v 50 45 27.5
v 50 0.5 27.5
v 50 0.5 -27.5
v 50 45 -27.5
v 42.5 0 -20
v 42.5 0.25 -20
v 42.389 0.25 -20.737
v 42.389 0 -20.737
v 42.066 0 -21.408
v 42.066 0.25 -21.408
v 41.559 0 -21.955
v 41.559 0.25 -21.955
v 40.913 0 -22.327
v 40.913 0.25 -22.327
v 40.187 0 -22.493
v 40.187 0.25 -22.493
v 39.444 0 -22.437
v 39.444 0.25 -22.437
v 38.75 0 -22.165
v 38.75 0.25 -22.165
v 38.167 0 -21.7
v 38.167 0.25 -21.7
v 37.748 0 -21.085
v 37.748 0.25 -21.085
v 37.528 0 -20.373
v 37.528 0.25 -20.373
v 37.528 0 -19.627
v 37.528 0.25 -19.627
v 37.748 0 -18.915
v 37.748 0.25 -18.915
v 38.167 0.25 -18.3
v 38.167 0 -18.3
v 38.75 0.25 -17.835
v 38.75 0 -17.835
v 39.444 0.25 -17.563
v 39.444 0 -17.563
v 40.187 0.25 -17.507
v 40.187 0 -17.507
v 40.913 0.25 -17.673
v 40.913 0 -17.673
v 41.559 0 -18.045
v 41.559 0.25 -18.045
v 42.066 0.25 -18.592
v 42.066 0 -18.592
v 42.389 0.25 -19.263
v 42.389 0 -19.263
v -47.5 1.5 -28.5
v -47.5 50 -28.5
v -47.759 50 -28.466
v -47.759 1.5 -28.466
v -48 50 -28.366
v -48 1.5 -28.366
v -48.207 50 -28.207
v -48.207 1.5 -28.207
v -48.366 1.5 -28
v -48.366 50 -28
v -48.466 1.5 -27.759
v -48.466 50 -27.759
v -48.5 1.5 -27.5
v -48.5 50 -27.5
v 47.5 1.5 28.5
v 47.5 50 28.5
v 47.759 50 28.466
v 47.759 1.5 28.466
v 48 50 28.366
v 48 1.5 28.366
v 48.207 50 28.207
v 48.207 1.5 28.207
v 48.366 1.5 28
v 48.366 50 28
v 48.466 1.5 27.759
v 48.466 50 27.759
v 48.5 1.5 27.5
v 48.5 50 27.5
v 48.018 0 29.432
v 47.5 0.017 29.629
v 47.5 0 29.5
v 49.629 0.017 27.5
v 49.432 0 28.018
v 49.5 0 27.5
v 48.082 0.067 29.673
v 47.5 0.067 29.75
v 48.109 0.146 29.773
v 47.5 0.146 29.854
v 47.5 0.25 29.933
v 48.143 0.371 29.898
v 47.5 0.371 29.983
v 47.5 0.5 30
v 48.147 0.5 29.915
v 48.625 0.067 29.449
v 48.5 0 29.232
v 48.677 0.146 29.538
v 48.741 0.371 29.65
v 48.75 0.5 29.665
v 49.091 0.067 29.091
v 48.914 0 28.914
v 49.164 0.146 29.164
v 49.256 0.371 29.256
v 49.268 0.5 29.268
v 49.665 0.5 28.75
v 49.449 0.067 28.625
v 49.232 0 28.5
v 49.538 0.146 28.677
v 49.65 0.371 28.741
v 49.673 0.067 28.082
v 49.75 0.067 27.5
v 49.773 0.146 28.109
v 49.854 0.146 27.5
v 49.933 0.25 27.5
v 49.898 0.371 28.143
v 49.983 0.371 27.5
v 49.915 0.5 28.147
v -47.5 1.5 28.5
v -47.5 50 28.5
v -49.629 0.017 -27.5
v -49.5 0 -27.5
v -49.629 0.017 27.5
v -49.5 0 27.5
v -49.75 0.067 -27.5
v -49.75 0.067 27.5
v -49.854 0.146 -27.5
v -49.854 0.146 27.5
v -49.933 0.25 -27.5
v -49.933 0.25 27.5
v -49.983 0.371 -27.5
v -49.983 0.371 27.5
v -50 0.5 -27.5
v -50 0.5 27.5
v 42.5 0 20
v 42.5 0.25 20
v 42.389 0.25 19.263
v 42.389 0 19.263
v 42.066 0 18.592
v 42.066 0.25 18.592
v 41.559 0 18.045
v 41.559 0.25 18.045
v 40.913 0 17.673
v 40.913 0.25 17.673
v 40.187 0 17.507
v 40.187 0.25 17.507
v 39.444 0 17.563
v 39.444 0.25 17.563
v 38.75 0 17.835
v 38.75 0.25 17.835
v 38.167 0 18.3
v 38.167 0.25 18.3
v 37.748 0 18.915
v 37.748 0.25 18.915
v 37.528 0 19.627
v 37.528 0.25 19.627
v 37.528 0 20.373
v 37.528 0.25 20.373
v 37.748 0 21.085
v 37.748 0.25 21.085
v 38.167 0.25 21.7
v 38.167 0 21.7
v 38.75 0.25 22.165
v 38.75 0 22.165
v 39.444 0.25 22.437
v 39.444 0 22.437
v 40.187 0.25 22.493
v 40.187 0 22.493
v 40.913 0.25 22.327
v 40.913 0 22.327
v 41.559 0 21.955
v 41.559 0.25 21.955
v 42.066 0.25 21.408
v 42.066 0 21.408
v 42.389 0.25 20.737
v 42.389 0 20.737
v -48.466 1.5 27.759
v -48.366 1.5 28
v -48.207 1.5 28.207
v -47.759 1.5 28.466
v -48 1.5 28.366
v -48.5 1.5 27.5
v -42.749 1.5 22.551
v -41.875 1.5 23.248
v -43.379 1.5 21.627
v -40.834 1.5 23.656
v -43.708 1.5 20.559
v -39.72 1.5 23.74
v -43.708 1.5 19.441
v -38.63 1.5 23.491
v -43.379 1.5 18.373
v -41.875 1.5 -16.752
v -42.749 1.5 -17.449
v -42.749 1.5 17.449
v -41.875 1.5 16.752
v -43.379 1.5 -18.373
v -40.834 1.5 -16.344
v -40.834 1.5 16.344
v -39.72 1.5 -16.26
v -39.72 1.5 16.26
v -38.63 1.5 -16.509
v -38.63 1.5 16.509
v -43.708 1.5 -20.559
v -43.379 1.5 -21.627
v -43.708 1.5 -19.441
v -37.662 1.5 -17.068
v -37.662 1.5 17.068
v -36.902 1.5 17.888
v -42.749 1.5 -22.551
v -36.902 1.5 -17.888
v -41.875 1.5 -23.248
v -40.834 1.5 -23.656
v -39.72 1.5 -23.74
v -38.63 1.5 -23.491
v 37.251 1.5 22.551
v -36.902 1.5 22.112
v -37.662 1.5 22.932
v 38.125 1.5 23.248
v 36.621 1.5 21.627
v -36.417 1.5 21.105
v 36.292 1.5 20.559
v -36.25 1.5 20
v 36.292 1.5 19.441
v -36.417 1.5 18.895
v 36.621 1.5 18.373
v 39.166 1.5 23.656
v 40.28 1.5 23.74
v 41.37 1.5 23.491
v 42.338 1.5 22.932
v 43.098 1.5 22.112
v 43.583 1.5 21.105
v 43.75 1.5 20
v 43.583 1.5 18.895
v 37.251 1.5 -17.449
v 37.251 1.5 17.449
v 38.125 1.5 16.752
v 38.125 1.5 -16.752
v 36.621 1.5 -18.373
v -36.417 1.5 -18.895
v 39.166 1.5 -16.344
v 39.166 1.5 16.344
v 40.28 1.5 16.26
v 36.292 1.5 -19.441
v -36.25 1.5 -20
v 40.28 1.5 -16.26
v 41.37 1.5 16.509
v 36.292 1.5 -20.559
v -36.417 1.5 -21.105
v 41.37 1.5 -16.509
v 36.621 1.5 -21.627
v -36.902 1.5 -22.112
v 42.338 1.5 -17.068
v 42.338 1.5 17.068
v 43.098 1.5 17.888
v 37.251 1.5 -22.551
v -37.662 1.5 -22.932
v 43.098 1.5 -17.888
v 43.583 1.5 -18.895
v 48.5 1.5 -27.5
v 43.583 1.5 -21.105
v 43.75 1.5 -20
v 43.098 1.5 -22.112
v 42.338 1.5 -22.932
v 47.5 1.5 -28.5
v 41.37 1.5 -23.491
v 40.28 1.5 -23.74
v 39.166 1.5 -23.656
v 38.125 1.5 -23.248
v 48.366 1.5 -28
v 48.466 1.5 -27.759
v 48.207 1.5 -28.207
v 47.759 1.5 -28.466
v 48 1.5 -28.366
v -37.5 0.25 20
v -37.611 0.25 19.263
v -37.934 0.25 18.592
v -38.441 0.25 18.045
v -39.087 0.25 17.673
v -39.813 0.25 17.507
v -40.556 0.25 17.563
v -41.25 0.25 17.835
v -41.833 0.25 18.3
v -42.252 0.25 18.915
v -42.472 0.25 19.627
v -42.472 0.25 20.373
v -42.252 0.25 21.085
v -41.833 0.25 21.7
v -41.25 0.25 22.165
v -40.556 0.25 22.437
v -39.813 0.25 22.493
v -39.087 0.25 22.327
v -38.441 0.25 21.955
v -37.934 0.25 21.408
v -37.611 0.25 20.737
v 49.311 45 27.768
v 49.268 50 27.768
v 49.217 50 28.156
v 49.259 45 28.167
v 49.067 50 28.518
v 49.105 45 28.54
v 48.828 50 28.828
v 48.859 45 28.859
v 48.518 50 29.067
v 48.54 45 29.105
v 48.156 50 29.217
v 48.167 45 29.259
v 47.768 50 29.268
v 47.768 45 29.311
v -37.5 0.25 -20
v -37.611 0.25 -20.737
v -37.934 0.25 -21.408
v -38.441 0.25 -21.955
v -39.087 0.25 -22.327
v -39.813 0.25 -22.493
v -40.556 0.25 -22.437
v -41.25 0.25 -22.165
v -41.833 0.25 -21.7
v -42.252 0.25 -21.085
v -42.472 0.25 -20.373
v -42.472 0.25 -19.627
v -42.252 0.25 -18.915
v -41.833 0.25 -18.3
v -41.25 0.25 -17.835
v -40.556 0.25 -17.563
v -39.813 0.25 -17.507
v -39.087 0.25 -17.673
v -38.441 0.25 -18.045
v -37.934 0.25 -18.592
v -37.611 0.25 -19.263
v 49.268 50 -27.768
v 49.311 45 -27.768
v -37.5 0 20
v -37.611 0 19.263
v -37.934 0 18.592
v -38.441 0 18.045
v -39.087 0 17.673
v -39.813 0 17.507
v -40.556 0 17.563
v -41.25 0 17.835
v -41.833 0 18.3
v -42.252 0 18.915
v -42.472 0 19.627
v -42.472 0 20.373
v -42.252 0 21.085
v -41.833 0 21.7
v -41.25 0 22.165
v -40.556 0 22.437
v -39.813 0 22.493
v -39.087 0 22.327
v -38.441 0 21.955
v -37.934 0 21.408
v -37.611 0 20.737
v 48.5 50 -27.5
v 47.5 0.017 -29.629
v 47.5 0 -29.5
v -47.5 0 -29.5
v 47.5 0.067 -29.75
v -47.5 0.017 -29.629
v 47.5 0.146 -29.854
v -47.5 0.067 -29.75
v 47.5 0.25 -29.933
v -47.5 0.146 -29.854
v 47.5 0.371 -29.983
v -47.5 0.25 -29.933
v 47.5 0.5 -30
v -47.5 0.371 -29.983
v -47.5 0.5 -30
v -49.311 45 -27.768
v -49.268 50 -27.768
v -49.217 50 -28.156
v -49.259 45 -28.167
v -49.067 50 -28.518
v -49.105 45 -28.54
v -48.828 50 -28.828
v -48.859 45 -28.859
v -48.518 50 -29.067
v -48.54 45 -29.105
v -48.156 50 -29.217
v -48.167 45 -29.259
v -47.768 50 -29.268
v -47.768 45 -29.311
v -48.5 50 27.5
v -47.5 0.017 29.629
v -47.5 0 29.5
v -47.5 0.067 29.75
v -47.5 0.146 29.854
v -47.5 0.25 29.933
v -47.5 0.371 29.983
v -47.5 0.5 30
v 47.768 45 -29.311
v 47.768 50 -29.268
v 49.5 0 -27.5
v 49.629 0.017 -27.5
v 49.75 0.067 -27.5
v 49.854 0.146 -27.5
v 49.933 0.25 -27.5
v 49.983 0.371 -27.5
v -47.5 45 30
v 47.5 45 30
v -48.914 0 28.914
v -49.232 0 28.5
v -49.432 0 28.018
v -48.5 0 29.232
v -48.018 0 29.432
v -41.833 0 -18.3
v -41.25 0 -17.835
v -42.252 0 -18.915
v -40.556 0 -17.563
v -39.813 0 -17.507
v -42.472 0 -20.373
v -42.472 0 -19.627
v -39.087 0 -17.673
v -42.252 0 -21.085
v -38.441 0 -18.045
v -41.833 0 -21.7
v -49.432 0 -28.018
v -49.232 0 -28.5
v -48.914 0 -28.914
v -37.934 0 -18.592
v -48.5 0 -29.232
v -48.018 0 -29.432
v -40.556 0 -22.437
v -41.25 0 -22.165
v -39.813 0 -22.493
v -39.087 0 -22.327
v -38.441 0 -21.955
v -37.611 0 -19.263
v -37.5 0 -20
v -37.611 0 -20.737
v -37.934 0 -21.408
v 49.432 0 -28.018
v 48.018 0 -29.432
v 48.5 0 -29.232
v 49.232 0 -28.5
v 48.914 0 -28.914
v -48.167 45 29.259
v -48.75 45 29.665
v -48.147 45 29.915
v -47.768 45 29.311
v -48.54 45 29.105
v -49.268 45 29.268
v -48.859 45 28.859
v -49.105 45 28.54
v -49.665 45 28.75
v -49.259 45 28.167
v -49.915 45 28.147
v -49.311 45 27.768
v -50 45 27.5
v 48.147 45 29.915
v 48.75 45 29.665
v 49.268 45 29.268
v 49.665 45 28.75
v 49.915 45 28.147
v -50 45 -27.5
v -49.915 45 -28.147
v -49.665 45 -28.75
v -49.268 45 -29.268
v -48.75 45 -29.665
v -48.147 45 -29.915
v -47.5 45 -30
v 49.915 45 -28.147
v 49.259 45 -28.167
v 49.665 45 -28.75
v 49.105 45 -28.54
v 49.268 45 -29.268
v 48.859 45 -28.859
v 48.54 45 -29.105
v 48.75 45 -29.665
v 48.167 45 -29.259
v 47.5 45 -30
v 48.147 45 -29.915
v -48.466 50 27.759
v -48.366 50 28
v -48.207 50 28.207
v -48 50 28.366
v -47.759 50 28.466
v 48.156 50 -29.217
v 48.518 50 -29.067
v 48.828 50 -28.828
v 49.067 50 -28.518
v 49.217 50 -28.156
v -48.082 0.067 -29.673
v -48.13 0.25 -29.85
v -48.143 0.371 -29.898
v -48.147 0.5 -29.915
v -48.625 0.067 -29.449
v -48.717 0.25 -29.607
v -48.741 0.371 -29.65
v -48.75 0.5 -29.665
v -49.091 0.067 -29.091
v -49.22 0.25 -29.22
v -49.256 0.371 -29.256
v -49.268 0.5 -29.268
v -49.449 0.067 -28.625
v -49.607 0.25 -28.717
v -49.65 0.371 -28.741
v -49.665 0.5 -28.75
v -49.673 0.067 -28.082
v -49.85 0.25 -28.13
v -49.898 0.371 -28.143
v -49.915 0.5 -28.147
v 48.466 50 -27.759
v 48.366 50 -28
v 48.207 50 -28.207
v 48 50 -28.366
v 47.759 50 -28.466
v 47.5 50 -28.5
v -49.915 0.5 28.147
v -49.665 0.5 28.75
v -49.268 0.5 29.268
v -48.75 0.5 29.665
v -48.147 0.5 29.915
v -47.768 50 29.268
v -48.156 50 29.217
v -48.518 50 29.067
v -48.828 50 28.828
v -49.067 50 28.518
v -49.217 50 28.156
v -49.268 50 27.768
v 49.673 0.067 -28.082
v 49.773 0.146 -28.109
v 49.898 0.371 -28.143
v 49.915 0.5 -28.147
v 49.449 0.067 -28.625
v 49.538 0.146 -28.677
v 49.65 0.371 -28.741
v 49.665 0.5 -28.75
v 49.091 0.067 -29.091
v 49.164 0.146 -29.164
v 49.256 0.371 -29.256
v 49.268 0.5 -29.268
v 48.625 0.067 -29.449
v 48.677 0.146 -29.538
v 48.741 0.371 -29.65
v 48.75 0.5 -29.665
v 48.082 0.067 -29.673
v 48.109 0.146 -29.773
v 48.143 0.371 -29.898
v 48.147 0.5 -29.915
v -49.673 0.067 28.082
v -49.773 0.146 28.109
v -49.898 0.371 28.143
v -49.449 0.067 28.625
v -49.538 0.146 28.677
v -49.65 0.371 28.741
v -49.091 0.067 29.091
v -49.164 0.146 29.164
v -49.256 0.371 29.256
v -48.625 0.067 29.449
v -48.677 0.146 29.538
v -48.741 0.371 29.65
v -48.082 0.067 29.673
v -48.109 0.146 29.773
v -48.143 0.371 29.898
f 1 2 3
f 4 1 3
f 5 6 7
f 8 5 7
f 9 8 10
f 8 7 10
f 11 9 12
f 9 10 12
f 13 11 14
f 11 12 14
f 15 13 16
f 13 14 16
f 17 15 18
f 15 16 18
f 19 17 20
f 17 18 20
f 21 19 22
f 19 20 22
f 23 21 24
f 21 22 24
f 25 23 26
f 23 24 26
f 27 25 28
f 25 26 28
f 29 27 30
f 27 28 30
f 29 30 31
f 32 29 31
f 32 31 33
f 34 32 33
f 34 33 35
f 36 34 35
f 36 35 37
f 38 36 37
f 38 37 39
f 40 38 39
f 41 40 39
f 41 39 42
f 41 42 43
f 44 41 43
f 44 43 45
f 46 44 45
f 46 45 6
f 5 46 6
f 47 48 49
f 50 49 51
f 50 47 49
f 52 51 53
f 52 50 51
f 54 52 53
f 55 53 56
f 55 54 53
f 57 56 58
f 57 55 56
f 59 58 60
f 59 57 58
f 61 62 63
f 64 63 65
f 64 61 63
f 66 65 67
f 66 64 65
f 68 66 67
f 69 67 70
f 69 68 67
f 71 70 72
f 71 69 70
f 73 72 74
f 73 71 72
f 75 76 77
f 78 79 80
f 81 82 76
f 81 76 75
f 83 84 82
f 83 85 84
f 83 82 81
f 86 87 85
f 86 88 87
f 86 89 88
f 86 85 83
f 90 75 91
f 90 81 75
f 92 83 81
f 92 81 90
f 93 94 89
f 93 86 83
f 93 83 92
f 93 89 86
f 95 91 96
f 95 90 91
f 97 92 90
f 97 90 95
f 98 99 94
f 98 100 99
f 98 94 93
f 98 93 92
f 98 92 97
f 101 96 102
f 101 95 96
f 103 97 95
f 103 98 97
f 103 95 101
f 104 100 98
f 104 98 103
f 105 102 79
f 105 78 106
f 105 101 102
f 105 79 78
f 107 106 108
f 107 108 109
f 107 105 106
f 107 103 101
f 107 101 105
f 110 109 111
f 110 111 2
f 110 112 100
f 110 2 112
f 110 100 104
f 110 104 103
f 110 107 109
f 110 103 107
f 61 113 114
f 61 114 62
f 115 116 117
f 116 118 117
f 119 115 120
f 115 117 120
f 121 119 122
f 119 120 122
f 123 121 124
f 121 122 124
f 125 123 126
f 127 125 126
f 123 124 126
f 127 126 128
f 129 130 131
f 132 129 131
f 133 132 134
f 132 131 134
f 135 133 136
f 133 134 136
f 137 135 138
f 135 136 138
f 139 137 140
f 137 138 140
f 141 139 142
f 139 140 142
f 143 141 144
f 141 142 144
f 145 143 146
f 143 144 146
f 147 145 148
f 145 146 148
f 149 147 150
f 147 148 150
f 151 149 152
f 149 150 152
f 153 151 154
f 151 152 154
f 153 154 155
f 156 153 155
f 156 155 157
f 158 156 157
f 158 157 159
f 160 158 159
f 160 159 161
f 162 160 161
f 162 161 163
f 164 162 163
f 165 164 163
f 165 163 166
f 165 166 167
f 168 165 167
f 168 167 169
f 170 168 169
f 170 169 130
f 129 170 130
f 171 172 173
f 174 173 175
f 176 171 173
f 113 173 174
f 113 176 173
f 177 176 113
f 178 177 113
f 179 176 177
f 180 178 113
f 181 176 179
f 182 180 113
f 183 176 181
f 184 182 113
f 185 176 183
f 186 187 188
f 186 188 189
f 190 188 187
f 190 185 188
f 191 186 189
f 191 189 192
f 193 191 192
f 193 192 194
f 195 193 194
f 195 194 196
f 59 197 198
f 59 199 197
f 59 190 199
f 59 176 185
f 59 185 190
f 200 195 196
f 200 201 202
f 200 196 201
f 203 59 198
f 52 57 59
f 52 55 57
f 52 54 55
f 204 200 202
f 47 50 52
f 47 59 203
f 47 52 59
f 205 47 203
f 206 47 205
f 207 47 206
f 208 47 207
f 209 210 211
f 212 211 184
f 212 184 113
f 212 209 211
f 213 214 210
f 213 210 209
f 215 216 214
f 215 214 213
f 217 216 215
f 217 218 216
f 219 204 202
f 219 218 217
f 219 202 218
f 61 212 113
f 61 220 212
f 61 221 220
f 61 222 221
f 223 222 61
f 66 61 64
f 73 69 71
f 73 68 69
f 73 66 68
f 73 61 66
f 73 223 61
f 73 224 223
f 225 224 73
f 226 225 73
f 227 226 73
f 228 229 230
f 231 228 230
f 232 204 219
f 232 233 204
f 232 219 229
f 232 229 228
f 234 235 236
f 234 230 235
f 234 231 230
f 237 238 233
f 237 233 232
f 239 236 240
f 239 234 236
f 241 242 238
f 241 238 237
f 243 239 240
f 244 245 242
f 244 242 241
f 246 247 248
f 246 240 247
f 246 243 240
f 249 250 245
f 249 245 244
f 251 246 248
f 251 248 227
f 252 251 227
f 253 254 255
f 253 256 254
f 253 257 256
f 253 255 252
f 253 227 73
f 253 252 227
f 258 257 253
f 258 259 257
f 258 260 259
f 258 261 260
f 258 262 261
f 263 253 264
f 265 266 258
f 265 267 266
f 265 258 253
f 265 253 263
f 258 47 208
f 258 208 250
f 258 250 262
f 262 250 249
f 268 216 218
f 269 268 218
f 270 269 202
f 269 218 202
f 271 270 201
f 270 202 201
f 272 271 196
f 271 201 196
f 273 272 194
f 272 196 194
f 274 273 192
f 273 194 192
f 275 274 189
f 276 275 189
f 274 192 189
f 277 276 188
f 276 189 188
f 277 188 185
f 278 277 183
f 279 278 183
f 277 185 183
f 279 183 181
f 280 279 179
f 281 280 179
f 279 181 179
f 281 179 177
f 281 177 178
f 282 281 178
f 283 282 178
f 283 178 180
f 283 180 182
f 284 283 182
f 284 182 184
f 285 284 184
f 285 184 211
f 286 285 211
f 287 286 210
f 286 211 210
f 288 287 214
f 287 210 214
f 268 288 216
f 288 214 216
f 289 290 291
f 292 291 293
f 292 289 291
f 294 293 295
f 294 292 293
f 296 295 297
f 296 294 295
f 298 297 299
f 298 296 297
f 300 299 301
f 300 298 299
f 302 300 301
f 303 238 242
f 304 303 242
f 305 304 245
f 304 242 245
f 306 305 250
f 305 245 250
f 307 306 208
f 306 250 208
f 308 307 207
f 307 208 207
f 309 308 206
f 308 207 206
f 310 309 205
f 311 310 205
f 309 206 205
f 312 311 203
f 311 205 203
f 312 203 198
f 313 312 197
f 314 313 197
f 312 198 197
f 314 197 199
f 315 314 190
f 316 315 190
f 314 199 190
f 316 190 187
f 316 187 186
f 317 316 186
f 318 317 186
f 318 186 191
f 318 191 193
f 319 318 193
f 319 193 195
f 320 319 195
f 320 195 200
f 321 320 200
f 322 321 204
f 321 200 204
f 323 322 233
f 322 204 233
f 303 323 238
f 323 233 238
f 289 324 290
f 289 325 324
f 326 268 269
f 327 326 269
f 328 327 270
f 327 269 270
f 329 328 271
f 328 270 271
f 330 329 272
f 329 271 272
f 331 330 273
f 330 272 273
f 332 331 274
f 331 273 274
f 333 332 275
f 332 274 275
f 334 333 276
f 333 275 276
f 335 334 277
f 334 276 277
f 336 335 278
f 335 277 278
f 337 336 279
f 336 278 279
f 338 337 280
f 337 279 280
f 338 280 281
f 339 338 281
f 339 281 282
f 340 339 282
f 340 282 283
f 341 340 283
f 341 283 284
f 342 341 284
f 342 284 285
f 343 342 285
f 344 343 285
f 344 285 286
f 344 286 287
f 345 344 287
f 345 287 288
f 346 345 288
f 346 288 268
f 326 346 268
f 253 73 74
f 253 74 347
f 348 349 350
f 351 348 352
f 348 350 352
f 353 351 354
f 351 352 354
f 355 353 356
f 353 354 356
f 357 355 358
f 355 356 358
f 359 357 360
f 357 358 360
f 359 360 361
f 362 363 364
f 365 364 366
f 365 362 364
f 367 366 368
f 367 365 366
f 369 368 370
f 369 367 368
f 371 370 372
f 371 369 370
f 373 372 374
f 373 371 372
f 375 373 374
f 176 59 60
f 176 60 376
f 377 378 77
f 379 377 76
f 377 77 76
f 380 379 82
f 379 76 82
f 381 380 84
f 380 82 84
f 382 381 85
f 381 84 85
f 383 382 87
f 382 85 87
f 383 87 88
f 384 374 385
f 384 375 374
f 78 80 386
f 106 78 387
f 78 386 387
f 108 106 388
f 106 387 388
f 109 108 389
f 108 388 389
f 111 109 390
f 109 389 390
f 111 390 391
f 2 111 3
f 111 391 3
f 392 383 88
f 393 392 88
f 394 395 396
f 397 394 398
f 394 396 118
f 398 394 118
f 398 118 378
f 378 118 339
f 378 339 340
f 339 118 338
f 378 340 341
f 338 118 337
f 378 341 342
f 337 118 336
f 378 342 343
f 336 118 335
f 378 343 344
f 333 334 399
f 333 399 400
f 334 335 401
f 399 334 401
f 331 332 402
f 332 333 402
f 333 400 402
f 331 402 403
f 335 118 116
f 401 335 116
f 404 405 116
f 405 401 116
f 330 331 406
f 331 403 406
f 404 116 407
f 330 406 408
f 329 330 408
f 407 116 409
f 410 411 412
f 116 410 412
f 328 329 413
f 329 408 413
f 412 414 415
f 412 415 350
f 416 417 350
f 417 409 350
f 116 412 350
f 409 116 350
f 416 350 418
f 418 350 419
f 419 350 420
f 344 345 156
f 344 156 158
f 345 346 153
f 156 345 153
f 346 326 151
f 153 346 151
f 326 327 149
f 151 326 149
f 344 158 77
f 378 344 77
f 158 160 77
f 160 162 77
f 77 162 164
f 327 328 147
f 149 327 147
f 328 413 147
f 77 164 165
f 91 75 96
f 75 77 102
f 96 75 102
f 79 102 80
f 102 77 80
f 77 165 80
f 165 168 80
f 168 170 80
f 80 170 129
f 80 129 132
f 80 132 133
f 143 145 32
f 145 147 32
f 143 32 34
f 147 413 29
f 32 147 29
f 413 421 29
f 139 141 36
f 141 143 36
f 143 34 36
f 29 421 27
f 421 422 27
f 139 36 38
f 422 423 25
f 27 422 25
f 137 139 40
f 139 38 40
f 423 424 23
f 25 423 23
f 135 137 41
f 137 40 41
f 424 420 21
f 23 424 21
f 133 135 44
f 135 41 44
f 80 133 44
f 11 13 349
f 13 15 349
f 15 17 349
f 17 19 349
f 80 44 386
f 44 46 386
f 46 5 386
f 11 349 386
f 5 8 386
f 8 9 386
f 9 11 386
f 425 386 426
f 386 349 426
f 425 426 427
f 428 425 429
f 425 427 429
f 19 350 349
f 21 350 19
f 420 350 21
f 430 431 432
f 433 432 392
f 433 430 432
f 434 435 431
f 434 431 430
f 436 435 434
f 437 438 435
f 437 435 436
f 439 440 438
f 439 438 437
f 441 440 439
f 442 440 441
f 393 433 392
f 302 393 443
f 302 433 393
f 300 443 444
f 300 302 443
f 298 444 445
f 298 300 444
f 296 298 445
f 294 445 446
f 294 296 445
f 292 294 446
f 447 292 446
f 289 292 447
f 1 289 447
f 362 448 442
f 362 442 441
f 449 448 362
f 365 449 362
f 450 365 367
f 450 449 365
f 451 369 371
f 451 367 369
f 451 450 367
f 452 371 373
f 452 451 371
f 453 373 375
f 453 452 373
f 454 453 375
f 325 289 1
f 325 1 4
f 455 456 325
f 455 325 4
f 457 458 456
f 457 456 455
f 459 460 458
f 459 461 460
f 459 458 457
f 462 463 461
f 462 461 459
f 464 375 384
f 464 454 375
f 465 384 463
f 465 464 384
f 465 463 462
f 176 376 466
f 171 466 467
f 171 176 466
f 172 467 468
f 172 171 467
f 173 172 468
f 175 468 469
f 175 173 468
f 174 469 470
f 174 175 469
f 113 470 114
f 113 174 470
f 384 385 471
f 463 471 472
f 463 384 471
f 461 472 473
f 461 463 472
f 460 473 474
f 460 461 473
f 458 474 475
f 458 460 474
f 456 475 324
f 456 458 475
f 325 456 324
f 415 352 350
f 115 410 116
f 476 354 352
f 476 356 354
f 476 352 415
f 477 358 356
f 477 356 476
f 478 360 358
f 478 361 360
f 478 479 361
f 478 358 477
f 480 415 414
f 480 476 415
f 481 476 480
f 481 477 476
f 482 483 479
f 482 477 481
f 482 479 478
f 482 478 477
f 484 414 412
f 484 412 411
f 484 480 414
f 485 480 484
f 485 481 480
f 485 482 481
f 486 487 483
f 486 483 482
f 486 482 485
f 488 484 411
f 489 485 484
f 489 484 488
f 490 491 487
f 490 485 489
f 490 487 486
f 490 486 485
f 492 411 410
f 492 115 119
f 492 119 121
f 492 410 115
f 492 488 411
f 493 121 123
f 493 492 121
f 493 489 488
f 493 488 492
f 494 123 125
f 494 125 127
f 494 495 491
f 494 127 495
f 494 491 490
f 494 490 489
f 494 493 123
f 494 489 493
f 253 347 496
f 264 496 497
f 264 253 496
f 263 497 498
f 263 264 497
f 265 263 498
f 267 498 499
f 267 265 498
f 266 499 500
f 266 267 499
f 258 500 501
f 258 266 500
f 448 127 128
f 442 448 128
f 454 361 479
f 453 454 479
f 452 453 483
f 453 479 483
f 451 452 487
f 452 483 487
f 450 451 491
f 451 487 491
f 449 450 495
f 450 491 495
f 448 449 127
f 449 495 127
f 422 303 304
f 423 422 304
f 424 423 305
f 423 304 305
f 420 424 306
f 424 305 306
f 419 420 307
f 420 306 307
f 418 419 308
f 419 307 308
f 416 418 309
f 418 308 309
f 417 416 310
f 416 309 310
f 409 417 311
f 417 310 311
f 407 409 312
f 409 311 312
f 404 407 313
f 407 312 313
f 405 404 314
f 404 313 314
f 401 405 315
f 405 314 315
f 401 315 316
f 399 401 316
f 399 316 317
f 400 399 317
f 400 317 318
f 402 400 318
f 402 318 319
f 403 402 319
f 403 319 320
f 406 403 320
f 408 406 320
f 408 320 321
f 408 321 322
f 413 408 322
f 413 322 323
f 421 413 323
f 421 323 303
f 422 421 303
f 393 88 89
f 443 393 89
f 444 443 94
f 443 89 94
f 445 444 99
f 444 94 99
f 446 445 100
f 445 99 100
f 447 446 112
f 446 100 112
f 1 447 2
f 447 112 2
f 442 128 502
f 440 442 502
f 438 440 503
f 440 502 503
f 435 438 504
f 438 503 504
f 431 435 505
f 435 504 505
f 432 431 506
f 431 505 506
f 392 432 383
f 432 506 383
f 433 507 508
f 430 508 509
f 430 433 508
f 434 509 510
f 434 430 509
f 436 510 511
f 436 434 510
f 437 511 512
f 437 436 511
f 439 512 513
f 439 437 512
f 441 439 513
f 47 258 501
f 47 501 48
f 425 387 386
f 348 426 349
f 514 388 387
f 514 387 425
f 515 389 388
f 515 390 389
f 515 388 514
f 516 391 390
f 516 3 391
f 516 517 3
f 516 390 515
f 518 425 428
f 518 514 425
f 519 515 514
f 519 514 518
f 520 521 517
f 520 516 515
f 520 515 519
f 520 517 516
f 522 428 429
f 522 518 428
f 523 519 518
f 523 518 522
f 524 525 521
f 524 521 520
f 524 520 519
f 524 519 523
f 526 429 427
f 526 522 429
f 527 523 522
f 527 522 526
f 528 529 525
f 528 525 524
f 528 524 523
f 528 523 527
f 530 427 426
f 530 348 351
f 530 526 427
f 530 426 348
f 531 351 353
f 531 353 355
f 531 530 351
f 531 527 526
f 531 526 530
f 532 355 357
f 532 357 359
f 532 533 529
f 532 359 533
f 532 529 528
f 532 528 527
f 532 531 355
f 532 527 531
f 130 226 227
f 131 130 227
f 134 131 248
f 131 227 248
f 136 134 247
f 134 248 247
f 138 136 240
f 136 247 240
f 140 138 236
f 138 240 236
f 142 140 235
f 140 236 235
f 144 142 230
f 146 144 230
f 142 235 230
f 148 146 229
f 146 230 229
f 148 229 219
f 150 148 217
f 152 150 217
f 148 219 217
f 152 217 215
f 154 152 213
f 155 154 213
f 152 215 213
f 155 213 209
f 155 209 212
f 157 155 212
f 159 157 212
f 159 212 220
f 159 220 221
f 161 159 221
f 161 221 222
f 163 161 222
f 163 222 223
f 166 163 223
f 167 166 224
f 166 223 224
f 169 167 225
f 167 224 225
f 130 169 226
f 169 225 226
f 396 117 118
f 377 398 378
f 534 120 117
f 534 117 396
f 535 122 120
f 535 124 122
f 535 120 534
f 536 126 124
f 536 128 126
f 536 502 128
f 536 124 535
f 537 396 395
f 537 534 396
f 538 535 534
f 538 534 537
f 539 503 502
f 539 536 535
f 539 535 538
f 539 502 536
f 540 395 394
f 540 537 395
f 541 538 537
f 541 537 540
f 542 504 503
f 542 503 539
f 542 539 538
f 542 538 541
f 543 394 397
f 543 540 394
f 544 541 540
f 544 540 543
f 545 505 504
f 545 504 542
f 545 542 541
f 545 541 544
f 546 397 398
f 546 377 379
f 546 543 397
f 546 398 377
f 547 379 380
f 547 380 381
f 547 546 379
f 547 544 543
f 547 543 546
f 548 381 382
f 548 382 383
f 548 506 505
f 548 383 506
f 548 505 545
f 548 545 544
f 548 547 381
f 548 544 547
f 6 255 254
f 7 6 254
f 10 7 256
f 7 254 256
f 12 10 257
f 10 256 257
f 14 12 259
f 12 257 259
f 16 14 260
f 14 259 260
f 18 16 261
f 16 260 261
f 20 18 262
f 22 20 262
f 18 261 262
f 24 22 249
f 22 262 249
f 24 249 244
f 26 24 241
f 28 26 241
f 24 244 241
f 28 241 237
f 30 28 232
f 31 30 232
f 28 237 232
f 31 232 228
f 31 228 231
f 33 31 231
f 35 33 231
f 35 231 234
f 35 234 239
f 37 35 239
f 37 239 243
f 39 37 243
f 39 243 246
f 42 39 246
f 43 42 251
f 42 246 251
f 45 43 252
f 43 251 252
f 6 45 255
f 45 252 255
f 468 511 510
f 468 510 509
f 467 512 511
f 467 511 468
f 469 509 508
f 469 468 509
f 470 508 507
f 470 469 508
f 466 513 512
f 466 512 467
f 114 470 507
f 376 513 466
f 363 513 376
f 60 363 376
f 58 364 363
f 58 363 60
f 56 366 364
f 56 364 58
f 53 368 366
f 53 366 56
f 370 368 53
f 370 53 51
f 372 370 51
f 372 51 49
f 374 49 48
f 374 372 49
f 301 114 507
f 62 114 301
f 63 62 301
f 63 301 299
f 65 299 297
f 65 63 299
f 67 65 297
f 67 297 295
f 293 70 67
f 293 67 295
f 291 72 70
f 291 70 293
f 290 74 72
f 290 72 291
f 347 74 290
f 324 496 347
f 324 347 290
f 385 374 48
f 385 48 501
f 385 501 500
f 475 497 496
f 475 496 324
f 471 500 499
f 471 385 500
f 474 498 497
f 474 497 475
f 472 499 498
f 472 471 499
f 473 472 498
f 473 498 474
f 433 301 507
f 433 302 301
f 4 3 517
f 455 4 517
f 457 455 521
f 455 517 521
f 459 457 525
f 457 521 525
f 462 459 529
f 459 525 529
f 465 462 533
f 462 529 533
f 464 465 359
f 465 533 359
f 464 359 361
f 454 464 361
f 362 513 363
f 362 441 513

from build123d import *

# Parameters (mm, degrees)
BOSS_EXTRUDE1_DEPTH = 50
SHELL1_T            = -1.5
SKETCH2_R           = 2.5
CUT_EXTRUDE1_DEPTH  = 50
SKETCH3_OUTSIDE_W   = 127.464
SKETCH3_OUTSIDE_H   = 87.464
CUT_EXTRUDE2_DEPTH  = 5
CUT_EXTRUDE2_TAPER  = 0.5
FILLET1_R           = 0.5
CHAMFER1_SIZE       = 1.25


with BuildPart() as part:
    # Sketch1 → Boss-Extrude1 (new body)
    with BuildSketch(Plane(origin=(0, 0, 0), x_dir=(1, 0, 0), z_dir=(0, 1, 0))):
        with BuildLine():
            Line((-47.5, -30), (47.5, -30))
            ThreePointArc((47.5, -30), (49.267766953, -29.267766953), (50, -27.5))
            Line((50, -27.5), (50, 27.5))
            ThreePointArc((50, 27.5), (49.267766953, 29.267766953), (47.5, 30))
            Line((47.5, 30), (-47.5, 30))
            ThreePointArc((-47.5, 30), (-49.267766953, 29.267766953), (-50, 27.5))
            Line((-50, 27.5), (-50, -27.5))
            ThreePointArc((-50, -27.5), (-49.267766953, -29.267766953), (-47.5, -30))
        make_face()
    extrude(amount=BOSS_EXTRUDE1_DEPTH)

    # Shell1
    shell1_openings = [part.faces().sort_by_distance(p)[0] for p in [
        (0, 50, 0),
    ]]
    offset(amount=SHELL1_T, openings=shell1_openings, kind=Kind.INTERSECTION)

    # Sketch2 → Cut-Extrude1 (cut)
    with BuildSketch(Plane(origin=(0, 1.5, 0), x_dir=(1, 0, 0), z_dir=(0, 1, 0))):
        with Locations((-40, 20)):
            Circle(SKETCH2_R)
        with Locations((40, 20)):
            Circle(SKETCH2_R)
        with Locations((40, -20)):
            Circle(SKETCH2_R)
        with Locations((-40, -20)):
            Circle(SKETCH2_R)
    extrude(amount=-CUT_EXTRUDE1_DEPTH, mode=Mode.SUBTRACT)

    # Sketch3 outside → Cut-Extrude2 (cut)
    with BuildSketch(Plane(origin=(0, 50, 0), x_dir=(1, 0, 0), z_dir=(0, 1, 0))):
        Rectangle(SKETCH3_OUTSIDE_W, SKETCH3_OUTSIDE_H)
        with BuildLine():
            Line((-47.767766953, -29.267766953), (47.767766953, -29.267766953))
            ThreePointArc((47.767766953, -29.267766953), (48.828427125, -28.828427125), (49.267766953, -27.767766953))
            Line((49.267766953, -27.767766953), (49.267766953, 27.767766953))
            ThreePointArc((49.267766953, 27.767766953), (48.828427125, 28.828427125), (47.767766953, 29.267766953))
            Line((47.767766953, 29.267766953), (-47.767766953, 29.267766953))
            ThreePointArc((-47.767766953, 29.267766953), (-48.828427125, 28.828427125), (-49.267766953, 27.767766953))
            Line((-49.267766953, 27.767766953), (-49.267766953, -27.767766953))
            ThreePointArc((-49.267766953, -27.767766953), (-48.828427125, -28.828427125), (-47.767766953, -29.267766953))
        make_face(mode=Mode.SUBTRACT)
    extrude(amount=-CUT_EXTRUDE2_DEPTH, taper=CUT_EXTRUDE2_TAPER, mode=Mode.SUBTRACT)

    # Fillet1
    fillet1_edges = [part.edges().sort_by_distance(p)[0] for p in [
        (-50, 0, 0),
        (-49.267766953, 0, -29.267766953),
        (0, 0, -30),
        (49.267766953, 0, -29.267766953),
        (50, 0, 0),
        (49.267766953, 0, 29.267766953),
        (0, 0, 30),
        (-49.267766953, 0, 29.267766953),
    ]]
    fillet(fillet1_edges, radius=FILLET1_R)

    # Chamfer1
    chamfer1_edges = [part.edges().sort_by_distance(p)[0] for p in [
        (-42.5, 1.5, -20),
        (37.5, 1.5, -20),
        (37.5, 1.5, 20),
        (-42.5, 1.5, 20),
    ]]
    chamfer(chamfer1_edges, length=CHAMFER1_SIZE)


solid = part.part
